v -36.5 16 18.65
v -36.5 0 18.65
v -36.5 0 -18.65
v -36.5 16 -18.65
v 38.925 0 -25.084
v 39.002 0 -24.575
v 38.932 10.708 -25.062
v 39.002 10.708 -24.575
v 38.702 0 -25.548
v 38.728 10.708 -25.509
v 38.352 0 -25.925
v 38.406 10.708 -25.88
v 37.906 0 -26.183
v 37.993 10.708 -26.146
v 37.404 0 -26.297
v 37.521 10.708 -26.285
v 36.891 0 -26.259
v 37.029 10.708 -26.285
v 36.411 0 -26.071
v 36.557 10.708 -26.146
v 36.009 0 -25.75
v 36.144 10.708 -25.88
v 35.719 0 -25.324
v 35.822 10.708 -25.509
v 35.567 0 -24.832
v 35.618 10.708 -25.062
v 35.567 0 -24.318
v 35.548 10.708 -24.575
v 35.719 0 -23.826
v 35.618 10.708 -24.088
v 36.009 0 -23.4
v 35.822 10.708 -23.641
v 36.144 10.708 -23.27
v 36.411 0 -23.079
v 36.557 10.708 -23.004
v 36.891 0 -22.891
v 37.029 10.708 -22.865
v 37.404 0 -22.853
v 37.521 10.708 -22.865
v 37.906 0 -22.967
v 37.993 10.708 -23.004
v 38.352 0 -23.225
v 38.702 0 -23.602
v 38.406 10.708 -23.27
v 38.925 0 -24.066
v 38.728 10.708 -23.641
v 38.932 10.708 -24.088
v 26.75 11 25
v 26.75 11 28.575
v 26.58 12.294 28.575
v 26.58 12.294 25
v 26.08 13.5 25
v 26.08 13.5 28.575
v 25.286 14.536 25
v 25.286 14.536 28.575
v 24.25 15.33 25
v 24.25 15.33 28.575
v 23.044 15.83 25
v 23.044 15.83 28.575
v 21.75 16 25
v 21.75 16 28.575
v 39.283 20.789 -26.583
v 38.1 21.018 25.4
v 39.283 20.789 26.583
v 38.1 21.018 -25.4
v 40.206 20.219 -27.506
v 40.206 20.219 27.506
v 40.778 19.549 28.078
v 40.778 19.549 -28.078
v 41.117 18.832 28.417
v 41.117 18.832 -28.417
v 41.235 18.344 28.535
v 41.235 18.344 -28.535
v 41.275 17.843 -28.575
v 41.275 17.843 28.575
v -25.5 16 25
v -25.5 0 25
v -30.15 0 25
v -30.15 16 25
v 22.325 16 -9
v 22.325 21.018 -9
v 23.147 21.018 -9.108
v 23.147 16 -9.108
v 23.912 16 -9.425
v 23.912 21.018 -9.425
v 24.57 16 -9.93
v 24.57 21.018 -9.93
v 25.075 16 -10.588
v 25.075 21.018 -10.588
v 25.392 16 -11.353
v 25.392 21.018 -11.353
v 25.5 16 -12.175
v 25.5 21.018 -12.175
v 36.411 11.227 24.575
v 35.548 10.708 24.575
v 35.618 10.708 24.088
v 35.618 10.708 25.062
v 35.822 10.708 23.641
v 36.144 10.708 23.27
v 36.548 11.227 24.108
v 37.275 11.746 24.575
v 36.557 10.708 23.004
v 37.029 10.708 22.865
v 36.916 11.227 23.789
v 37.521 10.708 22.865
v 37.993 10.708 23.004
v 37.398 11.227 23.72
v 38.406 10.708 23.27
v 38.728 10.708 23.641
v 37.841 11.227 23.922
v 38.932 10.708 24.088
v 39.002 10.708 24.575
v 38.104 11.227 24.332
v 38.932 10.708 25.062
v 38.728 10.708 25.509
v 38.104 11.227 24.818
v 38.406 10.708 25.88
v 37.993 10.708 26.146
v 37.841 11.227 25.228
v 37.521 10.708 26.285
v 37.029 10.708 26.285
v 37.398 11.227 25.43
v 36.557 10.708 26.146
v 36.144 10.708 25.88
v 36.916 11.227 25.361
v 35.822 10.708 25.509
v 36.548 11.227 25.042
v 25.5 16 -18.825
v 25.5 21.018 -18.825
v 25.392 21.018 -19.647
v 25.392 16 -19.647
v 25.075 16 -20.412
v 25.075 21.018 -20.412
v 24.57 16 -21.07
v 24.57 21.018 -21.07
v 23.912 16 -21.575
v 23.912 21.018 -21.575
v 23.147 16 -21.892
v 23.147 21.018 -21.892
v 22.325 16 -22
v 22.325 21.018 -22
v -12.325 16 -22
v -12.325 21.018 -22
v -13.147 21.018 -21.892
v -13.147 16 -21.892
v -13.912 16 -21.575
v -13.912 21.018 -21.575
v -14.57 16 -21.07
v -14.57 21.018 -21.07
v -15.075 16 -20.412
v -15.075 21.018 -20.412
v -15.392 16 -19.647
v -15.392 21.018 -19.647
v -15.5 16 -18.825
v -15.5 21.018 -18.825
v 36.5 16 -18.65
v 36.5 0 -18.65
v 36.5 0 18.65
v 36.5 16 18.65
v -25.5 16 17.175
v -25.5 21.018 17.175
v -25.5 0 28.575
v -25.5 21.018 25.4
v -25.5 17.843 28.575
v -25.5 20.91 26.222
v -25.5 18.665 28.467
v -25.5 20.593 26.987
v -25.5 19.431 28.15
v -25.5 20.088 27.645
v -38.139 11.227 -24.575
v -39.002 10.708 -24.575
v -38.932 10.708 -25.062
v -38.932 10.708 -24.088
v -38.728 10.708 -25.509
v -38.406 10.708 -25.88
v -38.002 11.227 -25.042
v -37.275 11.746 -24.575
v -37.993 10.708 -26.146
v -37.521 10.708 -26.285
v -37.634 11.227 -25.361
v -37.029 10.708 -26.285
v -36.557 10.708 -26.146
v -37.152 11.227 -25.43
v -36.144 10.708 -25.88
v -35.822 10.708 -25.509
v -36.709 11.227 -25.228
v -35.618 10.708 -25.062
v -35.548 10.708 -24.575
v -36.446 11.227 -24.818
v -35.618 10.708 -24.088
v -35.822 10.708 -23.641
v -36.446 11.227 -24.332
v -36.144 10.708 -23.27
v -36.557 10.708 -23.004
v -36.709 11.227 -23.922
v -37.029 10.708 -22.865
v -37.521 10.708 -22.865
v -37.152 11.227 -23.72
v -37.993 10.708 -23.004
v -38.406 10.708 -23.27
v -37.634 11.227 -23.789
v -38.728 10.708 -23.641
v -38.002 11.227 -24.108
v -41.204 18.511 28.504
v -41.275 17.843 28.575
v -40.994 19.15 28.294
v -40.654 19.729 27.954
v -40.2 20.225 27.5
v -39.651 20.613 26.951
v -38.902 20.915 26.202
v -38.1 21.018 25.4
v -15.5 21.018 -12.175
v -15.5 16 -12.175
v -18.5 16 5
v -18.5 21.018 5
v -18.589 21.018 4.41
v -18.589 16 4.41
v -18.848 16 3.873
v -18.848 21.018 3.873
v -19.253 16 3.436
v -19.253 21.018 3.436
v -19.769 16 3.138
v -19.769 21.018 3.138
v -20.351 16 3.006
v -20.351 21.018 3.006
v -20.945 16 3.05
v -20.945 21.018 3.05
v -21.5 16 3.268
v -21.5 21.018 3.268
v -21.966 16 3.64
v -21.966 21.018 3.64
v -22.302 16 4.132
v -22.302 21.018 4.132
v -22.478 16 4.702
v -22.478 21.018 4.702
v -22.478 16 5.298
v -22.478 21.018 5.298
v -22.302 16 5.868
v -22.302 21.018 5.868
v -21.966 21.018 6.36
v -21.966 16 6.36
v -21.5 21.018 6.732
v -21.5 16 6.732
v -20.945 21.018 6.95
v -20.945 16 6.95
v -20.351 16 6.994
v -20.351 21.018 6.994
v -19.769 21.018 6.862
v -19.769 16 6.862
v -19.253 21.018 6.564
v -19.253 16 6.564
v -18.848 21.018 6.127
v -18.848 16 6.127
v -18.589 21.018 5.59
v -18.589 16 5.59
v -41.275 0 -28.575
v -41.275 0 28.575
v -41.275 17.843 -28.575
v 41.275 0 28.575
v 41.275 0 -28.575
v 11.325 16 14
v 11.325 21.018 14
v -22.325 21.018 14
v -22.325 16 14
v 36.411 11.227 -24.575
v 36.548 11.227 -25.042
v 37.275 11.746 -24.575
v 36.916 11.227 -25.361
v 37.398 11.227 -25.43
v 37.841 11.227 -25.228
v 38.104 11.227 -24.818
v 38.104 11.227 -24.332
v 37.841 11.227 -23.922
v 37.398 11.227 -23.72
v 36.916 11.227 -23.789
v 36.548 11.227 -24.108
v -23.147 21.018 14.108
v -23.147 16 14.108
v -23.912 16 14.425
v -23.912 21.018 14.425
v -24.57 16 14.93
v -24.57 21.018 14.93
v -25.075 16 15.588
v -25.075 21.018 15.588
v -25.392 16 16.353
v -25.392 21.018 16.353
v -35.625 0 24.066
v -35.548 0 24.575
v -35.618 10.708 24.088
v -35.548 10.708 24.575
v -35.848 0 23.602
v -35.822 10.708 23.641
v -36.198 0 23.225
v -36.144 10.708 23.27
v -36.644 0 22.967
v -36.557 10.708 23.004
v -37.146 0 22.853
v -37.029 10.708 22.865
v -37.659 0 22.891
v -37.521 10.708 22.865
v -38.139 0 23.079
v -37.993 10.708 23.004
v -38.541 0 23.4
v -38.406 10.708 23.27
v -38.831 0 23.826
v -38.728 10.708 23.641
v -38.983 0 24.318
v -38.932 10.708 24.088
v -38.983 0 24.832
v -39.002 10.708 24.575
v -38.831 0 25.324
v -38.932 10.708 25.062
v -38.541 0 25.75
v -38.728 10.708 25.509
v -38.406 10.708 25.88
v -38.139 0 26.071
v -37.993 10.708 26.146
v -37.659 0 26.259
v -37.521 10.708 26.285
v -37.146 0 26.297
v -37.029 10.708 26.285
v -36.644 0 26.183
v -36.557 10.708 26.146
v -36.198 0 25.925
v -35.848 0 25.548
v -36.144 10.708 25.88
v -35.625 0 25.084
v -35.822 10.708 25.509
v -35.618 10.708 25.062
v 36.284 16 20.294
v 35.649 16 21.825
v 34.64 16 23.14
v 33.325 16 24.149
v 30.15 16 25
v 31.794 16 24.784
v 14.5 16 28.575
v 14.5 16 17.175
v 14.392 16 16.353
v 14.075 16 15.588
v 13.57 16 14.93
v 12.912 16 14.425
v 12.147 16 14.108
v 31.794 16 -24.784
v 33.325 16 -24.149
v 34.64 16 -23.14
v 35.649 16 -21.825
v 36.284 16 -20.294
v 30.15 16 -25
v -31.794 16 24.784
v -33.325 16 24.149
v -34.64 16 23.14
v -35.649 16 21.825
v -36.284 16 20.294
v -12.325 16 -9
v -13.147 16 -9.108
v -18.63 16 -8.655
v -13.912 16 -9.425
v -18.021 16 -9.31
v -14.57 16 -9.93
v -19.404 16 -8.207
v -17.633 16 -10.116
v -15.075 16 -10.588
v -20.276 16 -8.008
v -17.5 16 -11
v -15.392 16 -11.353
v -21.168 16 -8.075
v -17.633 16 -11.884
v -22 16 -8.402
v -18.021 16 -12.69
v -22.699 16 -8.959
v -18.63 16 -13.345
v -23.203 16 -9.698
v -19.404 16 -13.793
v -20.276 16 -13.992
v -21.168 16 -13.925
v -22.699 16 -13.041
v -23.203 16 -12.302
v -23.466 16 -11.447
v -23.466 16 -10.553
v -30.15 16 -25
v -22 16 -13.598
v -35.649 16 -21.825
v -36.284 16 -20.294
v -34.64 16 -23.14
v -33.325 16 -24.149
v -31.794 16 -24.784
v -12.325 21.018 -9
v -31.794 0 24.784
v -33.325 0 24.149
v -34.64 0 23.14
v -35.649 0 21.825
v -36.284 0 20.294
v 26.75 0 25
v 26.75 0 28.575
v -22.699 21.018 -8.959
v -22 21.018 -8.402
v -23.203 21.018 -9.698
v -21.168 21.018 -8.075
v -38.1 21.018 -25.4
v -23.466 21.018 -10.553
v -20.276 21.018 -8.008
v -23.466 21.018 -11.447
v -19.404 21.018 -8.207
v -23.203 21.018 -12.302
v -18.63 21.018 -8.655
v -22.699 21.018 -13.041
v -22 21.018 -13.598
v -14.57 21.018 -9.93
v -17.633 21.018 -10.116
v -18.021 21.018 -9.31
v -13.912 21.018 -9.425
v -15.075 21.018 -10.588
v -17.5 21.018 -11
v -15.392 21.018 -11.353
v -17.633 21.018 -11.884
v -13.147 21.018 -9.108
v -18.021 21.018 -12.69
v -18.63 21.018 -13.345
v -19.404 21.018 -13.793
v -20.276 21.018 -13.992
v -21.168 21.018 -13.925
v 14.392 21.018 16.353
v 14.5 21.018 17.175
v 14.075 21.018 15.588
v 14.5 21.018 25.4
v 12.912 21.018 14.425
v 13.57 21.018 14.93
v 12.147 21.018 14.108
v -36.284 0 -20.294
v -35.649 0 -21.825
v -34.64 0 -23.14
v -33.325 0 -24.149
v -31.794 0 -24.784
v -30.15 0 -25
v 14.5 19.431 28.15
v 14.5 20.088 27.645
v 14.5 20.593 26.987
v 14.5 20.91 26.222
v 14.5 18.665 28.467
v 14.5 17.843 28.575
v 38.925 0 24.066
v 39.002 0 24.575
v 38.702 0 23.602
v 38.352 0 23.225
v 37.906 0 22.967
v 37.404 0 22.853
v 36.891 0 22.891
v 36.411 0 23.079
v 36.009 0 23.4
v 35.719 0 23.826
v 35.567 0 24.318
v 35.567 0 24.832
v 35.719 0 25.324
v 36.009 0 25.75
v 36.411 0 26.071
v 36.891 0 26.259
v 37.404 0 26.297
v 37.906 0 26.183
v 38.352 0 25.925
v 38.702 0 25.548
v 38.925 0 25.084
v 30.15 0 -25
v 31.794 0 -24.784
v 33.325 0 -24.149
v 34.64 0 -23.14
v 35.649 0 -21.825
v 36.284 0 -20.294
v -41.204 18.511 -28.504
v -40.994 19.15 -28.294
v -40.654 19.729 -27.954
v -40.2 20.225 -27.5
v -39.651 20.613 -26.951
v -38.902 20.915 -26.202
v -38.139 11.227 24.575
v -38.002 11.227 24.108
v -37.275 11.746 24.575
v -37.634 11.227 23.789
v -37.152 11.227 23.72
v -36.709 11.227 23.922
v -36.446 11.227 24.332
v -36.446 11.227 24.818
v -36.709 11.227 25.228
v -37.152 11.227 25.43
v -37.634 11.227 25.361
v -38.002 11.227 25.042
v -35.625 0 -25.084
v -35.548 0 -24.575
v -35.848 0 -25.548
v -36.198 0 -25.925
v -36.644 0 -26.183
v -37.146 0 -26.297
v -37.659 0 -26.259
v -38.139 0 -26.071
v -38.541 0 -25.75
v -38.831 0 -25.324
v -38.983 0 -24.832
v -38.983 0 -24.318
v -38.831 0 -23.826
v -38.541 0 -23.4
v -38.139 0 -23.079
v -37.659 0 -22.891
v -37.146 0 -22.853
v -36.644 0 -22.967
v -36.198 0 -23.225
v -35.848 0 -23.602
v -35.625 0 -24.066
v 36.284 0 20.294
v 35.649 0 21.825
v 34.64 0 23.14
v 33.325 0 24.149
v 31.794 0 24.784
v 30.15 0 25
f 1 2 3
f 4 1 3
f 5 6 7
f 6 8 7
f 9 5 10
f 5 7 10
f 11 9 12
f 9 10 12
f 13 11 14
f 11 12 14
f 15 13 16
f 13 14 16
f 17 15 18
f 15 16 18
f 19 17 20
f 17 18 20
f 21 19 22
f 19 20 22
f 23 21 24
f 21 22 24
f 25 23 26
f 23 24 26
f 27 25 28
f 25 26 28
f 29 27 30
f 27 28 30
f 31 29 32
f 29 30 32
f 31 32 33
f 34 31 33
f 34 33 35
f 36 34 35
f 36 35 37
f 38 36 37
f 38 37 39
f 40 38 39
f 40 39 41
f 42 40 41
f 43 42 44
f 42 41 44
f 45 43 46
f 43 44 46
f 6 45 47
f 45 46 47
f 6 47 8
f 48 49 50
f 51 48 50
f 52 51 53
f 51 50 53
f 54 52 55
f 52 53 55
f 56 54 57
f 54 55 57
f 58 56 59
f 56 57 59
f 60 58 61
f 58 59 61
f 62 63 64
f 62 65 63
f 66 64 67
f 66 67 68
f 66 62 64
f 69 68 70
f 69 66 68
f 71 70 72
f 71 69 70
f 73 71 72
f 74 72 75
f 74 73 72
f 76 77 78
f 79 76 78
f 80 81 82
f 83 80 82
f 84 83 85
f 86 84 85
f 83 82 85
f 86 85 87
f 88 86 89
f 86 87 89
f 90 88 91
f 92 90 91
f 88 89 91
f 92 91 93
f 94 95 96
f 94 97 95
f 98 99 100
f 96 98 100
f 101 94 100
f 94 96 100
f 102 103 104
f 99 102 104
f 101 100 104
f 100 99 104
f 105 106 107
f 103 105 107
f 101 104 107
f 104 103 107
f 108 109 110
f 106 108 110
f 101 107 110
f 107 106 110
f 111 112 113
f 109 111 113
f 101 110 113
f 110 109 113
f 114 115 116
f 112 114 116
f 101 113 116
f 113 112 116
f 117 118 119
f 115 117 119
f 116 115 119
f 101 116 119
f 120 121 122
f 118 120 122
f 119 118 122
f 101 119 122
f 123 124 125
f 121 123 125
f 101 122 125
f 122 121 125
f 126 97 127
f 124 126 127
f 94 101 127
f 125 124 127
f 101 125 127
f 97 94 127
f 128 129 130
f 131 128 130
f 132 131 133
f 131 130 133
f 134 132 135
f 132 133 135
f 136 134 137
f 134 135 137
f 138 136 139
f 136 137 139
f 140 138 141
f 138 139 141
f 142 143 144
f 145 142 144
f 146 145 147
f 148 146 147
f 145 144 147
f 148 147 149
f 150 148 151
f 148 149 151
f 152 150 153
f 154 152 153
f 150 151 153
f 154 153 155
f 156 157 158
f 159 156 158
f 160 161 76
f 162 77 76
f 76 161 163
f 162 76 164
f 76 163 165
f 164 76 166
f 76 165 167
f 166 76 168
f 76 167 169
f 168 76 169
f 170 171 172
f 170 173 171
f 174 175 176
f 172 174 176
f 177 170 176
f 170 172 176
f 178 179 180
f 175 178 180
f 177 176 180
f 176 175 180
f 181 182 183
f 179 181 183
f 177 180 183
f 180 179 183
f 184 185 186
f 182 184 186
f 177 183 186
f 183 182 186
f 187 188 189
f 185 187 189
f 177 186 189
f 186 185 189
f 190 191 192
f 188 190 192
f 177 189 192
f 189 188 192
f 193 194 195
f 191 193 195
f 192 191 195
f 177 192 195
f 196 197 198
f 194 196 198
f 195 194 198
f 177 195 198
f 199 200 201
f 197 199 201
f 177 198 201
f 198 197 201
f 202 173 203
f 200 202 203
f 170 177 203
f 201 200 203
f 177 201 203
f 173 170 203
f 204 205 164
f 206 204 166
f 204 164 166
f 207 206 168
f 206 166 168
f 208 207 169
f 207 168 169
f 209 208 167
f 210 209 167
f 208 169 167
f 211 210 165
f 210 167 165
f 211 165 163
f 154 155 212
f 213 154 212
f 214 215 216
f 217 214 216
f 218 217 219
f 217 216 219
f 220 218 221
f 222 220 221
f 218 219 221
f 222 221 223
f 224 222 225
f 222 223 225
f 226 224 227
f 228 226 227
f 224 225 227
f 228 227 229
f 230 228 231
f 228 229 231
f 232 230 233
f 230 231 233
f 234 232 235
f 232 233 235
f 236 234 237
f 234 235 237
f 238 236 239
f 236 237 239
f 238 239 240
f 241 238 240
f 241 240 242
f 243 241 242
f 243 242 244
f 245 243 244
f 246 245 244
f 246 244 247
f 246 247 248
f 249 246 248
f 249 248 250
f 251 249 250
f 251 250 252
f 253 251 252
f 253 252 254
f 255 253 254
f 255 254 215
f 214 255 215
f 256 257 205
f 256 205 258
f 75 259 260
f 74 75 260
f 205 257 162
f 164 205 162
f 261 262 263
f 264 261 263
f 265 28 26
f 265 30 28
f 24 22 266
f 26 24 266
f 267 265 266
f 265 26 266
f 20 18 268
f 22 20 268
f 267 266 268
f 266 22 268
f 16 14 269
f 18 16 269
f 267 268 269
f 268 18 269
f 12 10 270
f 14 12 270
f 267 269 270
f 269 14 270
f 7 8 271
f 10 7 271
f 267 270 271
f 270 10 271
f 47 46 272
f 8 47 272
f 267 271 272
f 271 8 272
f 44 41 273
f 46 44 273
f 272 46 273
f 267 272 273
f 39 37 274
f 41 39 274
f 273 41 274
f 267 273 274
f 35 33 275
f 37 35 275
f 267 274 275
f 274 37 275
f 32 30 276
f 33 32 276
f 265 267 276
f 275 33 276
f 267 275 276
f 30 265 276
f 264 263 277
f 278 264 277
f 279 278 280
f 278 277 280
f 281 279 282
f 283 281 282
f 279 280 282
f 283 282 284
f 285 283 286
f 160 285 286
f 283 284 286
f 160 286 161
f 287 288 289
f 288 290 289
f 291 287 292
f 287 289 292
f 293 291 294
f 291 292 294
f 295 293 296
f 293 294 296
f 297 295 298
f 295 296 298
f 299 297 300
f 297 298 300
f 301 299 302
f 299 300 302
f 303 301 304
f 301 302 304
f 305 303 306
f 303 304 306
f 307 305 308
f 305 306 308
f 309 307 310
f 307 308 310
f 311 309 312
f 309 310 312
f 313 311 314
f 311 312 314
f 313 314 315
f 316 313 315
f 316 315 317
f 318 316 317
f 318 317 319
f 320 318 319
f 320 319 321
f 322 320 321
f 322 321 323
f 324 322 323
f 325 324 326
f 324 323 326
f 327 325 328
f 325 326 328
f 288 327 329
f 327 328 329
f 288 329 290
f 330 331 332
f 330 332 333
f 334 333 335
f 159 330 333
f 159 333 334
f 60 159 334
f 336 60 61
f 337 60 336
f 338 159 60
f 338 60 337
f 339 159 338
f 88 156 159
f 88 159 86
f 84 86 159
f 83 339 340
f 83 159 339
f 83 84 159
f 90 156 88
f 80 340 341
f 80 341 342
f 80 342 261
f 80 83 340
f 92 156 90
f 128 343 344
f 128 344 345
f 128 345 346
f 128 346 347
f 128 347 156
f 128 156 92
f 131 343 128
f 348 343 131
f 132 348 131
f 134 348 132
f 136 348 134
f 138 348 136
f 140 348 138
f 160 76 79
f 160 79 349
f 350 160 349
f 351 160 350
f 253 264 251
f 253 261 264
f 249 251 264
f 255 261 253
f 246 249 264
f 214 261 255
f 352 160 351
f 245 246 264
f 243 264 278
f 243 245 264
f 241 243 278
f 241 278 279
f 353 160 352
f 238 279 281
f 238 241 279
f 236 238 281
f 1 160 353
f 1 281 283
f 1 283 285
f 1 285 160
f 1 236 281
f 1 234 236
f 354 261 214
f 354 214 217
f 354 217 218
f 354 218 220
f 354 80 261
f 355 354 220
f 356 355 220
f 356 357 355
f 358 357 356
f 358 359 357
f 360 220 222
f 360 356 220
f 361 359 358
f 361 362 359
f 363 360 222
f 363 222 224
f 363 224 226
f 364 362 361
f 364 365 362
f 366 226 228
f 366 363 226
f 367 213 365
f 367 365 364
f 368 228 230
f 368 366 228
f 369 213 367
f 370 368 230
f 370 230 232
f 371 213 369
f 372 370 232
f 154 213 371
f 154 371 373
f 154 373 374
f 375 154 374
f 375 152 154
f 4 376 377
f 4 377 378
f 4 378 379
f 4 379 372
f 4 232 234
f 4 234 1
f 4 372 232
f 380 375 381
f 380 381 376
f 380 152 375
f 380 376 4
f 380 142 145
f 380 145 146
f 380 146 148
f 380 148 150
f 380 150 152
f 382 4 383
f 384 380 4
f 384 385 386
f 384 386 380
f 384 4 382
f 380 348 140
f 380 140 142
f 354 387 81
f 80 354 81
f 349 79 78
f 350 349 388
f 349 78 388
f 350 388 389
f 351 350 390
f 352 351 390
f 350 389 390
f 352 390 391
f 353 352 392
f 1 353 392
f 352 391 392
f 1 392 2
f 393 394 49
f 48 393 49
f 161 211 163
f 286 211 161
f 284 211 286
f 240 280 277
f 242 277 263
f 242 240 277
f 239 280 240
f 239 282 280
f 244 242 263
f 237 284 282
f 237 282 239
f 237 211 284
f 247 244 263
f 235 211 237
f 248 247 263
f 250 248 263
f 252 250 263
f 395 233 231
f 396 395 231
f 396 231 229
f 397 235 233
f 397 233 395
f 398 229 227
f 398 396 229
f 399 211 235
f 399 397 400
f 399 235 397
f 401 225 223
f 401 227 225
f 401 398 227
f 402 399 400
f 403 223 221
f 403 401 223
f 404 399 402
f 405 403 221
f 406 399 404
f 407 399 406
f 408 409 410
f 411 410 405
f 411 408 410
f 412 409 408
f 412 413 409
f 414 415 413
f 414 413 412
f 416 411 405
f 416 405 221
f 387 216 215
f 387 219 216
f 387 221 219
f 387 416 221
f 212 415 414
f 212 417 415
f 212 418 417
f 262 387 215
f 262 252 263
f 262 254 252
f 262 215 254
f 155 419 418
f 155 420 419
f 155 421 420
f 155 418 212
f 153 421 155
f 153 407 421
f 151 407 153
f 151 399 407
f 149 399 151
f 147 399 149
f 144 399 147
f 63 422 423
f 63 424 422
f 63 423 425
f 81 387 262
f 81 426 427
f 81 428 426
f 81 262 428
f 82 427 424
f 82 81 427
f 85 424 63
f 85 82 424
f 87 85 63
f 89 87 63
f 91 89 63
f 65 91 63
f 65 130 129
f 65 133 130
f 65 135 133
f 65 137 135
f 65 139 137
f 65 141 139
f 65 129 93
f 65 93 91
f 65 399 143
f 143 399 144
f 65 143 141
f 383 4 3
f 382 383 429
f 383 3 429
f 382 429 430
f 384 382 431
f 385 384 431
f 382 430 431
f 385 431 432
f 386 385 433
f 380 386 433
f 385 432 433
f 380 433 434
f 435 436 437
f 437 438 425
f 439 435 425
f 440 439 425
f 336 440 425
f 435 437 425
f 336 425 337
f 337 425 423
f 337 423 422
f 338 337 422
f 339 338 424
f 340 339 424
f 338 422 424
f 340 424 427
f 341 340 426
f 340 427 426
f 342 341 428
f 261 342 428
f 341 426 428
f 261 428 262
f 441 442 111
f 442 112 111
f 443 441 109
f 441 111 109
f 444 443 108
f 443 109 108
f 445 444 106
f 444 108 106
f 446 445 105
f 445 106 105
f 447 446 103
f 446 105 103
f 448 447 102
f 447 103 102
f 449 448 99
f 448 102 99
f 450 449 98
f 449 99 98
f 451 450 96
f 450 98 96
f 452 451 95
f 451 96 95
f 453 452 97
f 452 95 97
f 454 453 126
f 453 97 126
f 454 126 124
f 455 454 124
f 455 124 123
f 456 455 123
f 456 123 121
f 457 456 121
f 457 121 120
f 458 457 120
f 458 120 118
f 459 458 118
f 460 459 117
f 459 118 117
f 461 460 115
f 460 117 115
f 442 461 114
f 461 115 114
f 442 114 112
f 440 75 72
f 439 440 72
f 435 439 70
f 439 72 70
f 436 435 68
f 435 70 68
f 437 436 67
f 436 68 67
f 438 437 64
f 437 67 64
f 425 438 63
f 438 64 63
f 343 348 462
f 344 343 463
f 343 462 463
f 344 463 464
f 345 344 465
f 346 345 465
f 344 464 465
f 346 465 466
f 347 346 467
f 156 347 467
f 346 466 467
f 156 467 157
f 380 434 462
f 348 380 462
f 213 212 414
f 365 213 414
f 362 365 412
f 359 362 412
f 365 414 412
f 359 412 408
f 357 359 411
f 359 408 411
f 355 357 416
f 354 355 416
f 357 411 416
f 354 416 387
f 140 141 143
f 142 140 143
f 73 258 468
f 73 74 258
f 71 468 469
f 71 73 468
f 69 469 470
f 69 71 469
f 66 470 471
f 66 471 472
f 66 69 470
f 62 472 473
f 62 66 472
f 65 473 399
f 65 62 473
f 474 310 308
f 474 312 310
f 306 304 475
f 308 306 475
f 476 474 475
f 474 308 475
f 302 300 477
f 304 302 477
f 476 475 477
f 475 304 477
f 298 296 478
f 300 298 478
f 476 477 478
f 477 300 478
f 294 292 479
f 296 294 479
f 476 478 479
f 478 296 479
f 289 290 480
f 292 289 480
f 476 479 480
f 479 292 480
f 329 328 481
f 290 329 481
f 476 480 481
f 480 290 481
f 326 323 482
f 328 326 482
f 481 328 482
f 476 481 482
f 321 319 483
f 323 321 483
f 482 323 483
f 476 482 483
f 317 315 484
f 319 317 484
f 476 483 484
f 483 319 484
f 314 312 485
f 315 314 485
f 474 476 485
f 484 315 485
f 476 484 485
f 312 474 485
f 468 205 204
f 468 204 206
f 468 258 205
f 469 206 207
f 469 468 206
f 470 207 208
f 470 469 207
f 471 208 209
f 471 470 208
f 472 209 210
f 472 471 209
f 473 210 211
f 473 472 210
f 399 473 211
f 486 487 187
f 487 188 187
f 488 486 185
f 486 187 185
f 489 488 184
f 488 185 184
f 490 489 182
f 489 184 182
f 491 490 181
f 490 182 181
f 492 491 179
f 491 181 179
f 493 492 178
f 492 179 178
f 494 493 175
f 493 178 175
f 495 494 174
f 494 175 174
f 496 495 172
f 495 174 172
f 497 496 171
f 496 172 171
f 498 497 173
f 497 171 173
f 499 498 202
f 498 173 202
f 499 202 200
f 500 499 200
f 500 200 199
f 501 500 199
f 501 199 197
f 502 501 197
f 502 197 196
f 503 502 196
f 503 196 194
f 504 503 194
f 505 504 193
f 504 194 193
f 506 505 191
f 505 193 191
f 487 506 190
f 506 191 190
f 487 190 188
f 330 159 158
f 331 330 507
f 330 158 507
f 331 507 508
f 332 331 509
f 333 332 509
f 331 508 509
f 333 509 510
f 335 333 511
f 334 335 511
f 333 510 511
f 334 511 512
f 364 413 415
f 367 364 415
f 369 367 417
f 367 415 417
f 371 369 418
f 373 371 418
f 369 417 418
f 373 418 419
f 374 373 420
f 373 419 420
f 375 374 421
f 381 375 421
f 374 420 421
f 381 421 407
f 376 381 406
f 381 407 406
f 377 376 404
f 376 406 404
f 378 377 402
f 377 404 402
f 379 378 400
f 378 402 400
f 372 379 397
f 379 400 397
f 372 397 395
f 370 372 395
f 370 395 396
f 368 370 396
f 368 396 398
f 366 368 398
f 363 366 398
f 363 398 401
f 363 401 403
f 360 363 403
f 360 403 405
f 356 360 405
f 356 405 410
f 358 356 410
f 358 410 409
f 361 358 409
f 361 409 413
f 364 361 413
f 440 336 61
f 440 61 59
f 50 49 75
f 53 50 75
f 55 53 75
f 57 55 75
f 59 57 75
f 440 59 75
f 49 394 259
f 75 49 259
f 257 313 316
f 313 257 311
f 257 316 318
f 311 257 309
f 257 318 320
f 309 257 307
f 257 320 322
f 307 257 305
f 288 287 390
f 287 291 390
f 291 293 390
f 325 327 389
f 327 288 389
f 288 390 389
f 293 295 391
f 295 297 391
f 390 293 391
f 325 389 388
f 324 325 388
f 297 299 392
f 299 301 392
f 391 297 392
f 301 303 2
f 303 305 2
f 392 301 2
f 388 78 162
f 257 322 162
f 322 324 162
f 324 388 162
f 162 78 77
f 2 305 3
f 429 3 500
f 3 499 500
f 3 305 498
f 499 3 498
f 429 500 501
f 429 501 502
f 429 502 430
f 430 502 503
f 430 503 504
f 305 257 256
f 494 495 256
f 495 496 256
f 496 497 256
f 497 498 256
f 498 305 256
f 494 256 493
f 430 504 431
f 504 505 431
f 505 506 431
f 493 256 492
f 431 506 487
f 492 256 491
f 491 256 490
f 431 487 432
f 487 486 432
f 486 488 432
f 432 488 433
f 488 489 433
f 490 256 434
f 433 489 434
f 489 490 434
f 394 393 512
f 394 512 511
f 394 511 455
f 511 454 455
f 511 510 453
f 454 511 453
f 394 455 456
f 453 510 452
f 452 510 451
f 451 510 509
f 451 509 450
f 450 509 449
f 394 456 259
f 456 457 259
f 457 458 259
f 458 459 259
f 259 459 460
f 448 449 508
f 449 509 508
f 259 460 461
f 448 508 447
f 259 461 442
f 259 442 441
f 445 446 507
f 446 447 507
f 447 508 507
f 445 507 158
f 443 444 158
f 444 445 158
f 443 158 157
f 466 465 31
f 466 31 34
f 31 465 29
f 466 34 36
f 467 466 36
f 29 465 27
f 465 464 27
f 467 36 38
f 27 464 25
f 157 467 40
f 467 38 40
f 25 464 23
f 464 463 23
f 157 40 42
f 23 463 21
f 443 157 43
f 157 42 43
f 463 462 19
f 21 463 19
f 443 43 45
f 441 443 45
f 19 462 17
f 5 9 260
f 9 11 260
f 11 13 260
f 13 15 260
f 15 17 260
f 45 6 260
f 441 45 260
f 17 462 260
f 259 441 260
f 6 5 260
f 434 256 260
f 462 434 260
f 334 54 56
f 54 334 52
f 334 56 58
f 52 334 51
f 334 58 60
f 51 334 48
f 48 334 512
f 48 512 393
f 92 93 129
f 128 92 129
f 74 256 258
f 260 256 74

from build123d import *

# Parameters (mm, degrees)
SKETCH1_W                 = 82.55
SKETCH1_H                 = 57.15
BOSS_EXTRUDE1_DEPTH       = 21.018
CUT_EXTRUDE1_DEPTH        = 16
F_8_32_TAPPED_HOLE1_D     = 3.4544
F_8_32_TAPPED_HOLE1_DEPTH = 10.708
F_8_32_TAPPED_HOLE1_TIP   = 1.037806461
FILLET1_R                 = 3.175
SKETCH6_R                 = 3
SKETCH6_R_2               = 2
CUT_EXTRUDE2_DEPTH        = 22.018
CUT_EXTRUDE3_REACH        = 59.15


with BuildPart() as part:
    # Sketch1 → Boss-Extrude1 (new body)
    with BuildSketch(Plane(origin=(0, 0, 0), x_dir=(1, 0, 0), z_dir=(0, 1, 0))):
        Rectangle(SKETCH1_W, SKETCH1_H)
    extrude(amount=BOSS_EXTRUDE1_DEPTH)

    # Sketch2 → Cut-Extrude1 (cut)
    with BuildSketch(Plane(origin=(0, 0, 0), x_dir=(1, 0, 0), z_dir=(0, 1, 0))):
        with BuildLine():
            Line((30.15, -25), (-30.15, -25))
            ThreePointArc((-30.15, -25), (-34.640128061, -23.140128061), (-36.5, -18.65))
            Line((-36.5, -18.65), (-36.5, 18.65))
            ThreePointArc((-36.5, 18.65), (-34.640128061, 23.140128061), (-30.15, 25))
            Line((-30.15, 25), (30.15, 25))
            ThreePointArc((30.15, 25), (34.640128061, 23.140128061), (36.5, 18.65))
            Line((36.5, 18.65), (36.5, -18.65))
            ThreePointArc((36.5, -18.65), (34.640128061, -23.140128061), (30.15, -25))
        make_face()
    extrude(amount=CUT_EXTRUDE1_DEPTH, mode=Mode.SUBTRACT)

    # #8-32 Tapped Hole1
    with Locations(Plane(origin=(0, 0, 0), x_dir=(-1, 0, 0), z_dir=(0, -1, 0))):
        with Locations((37.275, -24.575), (37.275, 24.575), (-37.275, -24.575), (-37.275, 24.575)):
            Hole(F_8_32_TAPPED_HOLE1_D / 2, depth=F_8_32_TAPPED_HOLE1_DEPTH)
            with Locations((0, 0, -(F_8_32_TAPPED_HOLE1_DEPTH + F_8_32_TAPPED_HOLE1_TIP / 2))):  # 118° drill point
                Cone(0, F_8_32_TAPPED_HOLE1_D / 2, F_8_32_TAPPED_HOLE1_TIP, mode=Mode.SUBTRACT)

    # Fillet1
    fillet1_edges = [part.edges().sort_by_distance(p)[0] for p in [
        (41.275, 21.018, 0),
        (0, 21.018, -28.575),
        (-41.275, 21.018, 0),
        (0, 21.018, 28.575),
    ]]
    fillet(fillet1_edges, radius=FILLET1_R)

    # Sketch6 → Cut-Extrude2 (cut, through all)
    with BuildSketch(Plane(origin=(0, 21.018, 0), x_dir=(1, 0, 0), z_dir=(0, 1, 0))):
        with Locations((-20.5, 11)):
            Circle(SKETCH6_R)
        with Locations((-20.5, -5)):
            Circle(SKETCH6_R_2)
        with BuildLine():
            Line((-12.325, 9), (22.325, 9))
            ThreePointArc((22.325, 9), (24.57006403, 9.92993597), (25.5, 12.175))
            Line((25.5, 12.175), (25.5, 18.825))
            ThreePointArc((25.5, 18.825), (24.57006403, 21.07006403), (22.325, 22))
            Line((22.325, 22), (-12.325, 22))
            ThreePointArc((-12.325, 22), (-14.57006403, 21.07006403), (-15.5, 18.825))
            Line((-15.5, 18.825), (-15.5, 12.175))
            ThreePointArc((-15.5, 12.175), (-14.57006403, 9.92993597), (-12.325, 9))
        make_face()
        with BuildLine():
            Line((-25.5, -28.575), (14.5, -28.575))
            Line((14.5, -28.575), (14.5, -17.175))
            ThreePointArc((14.5, -17.175), (13.57006403, -14.92993597), (11.325, -14))
            Line((11.325, -14), (-22.325, -14))
            ThreePointArc((-22.325, -14), (-24.57006403, -14.92993597), (-25.5, -17.175))
            Line((-25.5, -17.175), (-25.5, -28.575))
        make_face()
    extrude(amount=-CUT_EXTRUDE2_DEPTH, mode=Mode.SUBTRACT)

    # Sketch7 → Cut-Extrude3 (cut, up to next)
    with BuildSketch(Plane.XY.offset(28.575), mode=Mode.PRIVATE) as cut_extrude3_sk1:
        with BuildLine():
            Line((21.75, 16), (14.5, 16))
            Line((14.5, 16), (14.5, 0))
            Line((14.5, 0), (26.75, 0))
            Line((26.75, 0), (26.75, 11))
            ThreePointArc((26.75, 11), (25.285533906, 14.535533906), (21.75, 16))
        make_face()
    cut_extrude3_tool1 = extrude(cut_extrude3_sk1.sketch, amount=-CUT_EXTRUDE3_REACH, mode=Mode.PRIVATE) & part.part
    add(cut_extrude3_tool1.solids().sort_by_distance((20.484055, 7.806287, 28.575))[0], mode=Mode.SUBTRACT)


solid = part.part
